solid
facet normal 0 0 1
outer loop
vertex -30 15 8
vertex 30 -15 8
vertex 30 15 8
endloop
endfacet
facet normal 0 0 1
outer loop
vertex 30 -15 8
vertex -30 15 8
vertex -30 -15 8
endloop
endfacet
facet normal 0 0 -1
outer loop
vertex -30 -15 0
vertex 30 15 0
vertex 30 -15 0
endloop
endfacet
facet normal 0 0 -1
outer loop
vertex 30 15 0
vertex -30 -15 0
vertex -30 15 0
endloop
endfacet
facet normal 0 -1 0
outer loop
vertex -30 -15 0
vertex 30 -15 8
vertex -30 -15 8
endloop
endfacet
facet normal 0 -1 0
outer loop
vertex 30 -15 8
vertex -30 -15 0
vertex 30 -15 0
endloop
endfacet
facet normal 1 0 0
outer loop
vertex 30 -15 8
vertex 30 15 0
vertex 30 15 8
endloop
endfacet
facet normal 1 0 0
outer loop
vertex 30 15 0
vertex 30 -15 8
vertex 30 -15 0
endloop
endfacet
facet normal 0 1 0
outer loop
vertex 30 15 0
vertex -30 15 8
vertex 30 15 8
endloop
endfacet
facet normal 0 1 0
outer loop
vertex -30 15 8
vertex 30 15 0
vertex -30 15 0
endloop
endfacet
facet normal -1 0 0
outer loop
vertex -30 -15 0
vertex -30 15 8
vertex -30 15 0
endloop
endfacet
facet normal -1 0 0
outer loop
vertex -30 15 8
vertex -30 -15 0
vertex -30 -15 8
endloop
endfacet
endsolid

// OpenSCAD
/*
Model: Basic parametric solid
Units: millimetres
Export: Render (F6), then export STL/3MF
*/

/* [Dimensions] */
width = 60; // [10:1:200]
depth = 30; // [10:1:200]
height = 8; // [1:0.5:80]

/* [Hidden] */
eps = 0.01;
$fn = 64;

assert(width > 0, "width must be positive");
assert(depth > 0, "depth must be positive");
assert(height > 0, "height must be positive");

module body() {
    translate([0, 0, height / 2])
        cube([width, depth, height], center = true);
}

module model() {
    body();
}

model();
